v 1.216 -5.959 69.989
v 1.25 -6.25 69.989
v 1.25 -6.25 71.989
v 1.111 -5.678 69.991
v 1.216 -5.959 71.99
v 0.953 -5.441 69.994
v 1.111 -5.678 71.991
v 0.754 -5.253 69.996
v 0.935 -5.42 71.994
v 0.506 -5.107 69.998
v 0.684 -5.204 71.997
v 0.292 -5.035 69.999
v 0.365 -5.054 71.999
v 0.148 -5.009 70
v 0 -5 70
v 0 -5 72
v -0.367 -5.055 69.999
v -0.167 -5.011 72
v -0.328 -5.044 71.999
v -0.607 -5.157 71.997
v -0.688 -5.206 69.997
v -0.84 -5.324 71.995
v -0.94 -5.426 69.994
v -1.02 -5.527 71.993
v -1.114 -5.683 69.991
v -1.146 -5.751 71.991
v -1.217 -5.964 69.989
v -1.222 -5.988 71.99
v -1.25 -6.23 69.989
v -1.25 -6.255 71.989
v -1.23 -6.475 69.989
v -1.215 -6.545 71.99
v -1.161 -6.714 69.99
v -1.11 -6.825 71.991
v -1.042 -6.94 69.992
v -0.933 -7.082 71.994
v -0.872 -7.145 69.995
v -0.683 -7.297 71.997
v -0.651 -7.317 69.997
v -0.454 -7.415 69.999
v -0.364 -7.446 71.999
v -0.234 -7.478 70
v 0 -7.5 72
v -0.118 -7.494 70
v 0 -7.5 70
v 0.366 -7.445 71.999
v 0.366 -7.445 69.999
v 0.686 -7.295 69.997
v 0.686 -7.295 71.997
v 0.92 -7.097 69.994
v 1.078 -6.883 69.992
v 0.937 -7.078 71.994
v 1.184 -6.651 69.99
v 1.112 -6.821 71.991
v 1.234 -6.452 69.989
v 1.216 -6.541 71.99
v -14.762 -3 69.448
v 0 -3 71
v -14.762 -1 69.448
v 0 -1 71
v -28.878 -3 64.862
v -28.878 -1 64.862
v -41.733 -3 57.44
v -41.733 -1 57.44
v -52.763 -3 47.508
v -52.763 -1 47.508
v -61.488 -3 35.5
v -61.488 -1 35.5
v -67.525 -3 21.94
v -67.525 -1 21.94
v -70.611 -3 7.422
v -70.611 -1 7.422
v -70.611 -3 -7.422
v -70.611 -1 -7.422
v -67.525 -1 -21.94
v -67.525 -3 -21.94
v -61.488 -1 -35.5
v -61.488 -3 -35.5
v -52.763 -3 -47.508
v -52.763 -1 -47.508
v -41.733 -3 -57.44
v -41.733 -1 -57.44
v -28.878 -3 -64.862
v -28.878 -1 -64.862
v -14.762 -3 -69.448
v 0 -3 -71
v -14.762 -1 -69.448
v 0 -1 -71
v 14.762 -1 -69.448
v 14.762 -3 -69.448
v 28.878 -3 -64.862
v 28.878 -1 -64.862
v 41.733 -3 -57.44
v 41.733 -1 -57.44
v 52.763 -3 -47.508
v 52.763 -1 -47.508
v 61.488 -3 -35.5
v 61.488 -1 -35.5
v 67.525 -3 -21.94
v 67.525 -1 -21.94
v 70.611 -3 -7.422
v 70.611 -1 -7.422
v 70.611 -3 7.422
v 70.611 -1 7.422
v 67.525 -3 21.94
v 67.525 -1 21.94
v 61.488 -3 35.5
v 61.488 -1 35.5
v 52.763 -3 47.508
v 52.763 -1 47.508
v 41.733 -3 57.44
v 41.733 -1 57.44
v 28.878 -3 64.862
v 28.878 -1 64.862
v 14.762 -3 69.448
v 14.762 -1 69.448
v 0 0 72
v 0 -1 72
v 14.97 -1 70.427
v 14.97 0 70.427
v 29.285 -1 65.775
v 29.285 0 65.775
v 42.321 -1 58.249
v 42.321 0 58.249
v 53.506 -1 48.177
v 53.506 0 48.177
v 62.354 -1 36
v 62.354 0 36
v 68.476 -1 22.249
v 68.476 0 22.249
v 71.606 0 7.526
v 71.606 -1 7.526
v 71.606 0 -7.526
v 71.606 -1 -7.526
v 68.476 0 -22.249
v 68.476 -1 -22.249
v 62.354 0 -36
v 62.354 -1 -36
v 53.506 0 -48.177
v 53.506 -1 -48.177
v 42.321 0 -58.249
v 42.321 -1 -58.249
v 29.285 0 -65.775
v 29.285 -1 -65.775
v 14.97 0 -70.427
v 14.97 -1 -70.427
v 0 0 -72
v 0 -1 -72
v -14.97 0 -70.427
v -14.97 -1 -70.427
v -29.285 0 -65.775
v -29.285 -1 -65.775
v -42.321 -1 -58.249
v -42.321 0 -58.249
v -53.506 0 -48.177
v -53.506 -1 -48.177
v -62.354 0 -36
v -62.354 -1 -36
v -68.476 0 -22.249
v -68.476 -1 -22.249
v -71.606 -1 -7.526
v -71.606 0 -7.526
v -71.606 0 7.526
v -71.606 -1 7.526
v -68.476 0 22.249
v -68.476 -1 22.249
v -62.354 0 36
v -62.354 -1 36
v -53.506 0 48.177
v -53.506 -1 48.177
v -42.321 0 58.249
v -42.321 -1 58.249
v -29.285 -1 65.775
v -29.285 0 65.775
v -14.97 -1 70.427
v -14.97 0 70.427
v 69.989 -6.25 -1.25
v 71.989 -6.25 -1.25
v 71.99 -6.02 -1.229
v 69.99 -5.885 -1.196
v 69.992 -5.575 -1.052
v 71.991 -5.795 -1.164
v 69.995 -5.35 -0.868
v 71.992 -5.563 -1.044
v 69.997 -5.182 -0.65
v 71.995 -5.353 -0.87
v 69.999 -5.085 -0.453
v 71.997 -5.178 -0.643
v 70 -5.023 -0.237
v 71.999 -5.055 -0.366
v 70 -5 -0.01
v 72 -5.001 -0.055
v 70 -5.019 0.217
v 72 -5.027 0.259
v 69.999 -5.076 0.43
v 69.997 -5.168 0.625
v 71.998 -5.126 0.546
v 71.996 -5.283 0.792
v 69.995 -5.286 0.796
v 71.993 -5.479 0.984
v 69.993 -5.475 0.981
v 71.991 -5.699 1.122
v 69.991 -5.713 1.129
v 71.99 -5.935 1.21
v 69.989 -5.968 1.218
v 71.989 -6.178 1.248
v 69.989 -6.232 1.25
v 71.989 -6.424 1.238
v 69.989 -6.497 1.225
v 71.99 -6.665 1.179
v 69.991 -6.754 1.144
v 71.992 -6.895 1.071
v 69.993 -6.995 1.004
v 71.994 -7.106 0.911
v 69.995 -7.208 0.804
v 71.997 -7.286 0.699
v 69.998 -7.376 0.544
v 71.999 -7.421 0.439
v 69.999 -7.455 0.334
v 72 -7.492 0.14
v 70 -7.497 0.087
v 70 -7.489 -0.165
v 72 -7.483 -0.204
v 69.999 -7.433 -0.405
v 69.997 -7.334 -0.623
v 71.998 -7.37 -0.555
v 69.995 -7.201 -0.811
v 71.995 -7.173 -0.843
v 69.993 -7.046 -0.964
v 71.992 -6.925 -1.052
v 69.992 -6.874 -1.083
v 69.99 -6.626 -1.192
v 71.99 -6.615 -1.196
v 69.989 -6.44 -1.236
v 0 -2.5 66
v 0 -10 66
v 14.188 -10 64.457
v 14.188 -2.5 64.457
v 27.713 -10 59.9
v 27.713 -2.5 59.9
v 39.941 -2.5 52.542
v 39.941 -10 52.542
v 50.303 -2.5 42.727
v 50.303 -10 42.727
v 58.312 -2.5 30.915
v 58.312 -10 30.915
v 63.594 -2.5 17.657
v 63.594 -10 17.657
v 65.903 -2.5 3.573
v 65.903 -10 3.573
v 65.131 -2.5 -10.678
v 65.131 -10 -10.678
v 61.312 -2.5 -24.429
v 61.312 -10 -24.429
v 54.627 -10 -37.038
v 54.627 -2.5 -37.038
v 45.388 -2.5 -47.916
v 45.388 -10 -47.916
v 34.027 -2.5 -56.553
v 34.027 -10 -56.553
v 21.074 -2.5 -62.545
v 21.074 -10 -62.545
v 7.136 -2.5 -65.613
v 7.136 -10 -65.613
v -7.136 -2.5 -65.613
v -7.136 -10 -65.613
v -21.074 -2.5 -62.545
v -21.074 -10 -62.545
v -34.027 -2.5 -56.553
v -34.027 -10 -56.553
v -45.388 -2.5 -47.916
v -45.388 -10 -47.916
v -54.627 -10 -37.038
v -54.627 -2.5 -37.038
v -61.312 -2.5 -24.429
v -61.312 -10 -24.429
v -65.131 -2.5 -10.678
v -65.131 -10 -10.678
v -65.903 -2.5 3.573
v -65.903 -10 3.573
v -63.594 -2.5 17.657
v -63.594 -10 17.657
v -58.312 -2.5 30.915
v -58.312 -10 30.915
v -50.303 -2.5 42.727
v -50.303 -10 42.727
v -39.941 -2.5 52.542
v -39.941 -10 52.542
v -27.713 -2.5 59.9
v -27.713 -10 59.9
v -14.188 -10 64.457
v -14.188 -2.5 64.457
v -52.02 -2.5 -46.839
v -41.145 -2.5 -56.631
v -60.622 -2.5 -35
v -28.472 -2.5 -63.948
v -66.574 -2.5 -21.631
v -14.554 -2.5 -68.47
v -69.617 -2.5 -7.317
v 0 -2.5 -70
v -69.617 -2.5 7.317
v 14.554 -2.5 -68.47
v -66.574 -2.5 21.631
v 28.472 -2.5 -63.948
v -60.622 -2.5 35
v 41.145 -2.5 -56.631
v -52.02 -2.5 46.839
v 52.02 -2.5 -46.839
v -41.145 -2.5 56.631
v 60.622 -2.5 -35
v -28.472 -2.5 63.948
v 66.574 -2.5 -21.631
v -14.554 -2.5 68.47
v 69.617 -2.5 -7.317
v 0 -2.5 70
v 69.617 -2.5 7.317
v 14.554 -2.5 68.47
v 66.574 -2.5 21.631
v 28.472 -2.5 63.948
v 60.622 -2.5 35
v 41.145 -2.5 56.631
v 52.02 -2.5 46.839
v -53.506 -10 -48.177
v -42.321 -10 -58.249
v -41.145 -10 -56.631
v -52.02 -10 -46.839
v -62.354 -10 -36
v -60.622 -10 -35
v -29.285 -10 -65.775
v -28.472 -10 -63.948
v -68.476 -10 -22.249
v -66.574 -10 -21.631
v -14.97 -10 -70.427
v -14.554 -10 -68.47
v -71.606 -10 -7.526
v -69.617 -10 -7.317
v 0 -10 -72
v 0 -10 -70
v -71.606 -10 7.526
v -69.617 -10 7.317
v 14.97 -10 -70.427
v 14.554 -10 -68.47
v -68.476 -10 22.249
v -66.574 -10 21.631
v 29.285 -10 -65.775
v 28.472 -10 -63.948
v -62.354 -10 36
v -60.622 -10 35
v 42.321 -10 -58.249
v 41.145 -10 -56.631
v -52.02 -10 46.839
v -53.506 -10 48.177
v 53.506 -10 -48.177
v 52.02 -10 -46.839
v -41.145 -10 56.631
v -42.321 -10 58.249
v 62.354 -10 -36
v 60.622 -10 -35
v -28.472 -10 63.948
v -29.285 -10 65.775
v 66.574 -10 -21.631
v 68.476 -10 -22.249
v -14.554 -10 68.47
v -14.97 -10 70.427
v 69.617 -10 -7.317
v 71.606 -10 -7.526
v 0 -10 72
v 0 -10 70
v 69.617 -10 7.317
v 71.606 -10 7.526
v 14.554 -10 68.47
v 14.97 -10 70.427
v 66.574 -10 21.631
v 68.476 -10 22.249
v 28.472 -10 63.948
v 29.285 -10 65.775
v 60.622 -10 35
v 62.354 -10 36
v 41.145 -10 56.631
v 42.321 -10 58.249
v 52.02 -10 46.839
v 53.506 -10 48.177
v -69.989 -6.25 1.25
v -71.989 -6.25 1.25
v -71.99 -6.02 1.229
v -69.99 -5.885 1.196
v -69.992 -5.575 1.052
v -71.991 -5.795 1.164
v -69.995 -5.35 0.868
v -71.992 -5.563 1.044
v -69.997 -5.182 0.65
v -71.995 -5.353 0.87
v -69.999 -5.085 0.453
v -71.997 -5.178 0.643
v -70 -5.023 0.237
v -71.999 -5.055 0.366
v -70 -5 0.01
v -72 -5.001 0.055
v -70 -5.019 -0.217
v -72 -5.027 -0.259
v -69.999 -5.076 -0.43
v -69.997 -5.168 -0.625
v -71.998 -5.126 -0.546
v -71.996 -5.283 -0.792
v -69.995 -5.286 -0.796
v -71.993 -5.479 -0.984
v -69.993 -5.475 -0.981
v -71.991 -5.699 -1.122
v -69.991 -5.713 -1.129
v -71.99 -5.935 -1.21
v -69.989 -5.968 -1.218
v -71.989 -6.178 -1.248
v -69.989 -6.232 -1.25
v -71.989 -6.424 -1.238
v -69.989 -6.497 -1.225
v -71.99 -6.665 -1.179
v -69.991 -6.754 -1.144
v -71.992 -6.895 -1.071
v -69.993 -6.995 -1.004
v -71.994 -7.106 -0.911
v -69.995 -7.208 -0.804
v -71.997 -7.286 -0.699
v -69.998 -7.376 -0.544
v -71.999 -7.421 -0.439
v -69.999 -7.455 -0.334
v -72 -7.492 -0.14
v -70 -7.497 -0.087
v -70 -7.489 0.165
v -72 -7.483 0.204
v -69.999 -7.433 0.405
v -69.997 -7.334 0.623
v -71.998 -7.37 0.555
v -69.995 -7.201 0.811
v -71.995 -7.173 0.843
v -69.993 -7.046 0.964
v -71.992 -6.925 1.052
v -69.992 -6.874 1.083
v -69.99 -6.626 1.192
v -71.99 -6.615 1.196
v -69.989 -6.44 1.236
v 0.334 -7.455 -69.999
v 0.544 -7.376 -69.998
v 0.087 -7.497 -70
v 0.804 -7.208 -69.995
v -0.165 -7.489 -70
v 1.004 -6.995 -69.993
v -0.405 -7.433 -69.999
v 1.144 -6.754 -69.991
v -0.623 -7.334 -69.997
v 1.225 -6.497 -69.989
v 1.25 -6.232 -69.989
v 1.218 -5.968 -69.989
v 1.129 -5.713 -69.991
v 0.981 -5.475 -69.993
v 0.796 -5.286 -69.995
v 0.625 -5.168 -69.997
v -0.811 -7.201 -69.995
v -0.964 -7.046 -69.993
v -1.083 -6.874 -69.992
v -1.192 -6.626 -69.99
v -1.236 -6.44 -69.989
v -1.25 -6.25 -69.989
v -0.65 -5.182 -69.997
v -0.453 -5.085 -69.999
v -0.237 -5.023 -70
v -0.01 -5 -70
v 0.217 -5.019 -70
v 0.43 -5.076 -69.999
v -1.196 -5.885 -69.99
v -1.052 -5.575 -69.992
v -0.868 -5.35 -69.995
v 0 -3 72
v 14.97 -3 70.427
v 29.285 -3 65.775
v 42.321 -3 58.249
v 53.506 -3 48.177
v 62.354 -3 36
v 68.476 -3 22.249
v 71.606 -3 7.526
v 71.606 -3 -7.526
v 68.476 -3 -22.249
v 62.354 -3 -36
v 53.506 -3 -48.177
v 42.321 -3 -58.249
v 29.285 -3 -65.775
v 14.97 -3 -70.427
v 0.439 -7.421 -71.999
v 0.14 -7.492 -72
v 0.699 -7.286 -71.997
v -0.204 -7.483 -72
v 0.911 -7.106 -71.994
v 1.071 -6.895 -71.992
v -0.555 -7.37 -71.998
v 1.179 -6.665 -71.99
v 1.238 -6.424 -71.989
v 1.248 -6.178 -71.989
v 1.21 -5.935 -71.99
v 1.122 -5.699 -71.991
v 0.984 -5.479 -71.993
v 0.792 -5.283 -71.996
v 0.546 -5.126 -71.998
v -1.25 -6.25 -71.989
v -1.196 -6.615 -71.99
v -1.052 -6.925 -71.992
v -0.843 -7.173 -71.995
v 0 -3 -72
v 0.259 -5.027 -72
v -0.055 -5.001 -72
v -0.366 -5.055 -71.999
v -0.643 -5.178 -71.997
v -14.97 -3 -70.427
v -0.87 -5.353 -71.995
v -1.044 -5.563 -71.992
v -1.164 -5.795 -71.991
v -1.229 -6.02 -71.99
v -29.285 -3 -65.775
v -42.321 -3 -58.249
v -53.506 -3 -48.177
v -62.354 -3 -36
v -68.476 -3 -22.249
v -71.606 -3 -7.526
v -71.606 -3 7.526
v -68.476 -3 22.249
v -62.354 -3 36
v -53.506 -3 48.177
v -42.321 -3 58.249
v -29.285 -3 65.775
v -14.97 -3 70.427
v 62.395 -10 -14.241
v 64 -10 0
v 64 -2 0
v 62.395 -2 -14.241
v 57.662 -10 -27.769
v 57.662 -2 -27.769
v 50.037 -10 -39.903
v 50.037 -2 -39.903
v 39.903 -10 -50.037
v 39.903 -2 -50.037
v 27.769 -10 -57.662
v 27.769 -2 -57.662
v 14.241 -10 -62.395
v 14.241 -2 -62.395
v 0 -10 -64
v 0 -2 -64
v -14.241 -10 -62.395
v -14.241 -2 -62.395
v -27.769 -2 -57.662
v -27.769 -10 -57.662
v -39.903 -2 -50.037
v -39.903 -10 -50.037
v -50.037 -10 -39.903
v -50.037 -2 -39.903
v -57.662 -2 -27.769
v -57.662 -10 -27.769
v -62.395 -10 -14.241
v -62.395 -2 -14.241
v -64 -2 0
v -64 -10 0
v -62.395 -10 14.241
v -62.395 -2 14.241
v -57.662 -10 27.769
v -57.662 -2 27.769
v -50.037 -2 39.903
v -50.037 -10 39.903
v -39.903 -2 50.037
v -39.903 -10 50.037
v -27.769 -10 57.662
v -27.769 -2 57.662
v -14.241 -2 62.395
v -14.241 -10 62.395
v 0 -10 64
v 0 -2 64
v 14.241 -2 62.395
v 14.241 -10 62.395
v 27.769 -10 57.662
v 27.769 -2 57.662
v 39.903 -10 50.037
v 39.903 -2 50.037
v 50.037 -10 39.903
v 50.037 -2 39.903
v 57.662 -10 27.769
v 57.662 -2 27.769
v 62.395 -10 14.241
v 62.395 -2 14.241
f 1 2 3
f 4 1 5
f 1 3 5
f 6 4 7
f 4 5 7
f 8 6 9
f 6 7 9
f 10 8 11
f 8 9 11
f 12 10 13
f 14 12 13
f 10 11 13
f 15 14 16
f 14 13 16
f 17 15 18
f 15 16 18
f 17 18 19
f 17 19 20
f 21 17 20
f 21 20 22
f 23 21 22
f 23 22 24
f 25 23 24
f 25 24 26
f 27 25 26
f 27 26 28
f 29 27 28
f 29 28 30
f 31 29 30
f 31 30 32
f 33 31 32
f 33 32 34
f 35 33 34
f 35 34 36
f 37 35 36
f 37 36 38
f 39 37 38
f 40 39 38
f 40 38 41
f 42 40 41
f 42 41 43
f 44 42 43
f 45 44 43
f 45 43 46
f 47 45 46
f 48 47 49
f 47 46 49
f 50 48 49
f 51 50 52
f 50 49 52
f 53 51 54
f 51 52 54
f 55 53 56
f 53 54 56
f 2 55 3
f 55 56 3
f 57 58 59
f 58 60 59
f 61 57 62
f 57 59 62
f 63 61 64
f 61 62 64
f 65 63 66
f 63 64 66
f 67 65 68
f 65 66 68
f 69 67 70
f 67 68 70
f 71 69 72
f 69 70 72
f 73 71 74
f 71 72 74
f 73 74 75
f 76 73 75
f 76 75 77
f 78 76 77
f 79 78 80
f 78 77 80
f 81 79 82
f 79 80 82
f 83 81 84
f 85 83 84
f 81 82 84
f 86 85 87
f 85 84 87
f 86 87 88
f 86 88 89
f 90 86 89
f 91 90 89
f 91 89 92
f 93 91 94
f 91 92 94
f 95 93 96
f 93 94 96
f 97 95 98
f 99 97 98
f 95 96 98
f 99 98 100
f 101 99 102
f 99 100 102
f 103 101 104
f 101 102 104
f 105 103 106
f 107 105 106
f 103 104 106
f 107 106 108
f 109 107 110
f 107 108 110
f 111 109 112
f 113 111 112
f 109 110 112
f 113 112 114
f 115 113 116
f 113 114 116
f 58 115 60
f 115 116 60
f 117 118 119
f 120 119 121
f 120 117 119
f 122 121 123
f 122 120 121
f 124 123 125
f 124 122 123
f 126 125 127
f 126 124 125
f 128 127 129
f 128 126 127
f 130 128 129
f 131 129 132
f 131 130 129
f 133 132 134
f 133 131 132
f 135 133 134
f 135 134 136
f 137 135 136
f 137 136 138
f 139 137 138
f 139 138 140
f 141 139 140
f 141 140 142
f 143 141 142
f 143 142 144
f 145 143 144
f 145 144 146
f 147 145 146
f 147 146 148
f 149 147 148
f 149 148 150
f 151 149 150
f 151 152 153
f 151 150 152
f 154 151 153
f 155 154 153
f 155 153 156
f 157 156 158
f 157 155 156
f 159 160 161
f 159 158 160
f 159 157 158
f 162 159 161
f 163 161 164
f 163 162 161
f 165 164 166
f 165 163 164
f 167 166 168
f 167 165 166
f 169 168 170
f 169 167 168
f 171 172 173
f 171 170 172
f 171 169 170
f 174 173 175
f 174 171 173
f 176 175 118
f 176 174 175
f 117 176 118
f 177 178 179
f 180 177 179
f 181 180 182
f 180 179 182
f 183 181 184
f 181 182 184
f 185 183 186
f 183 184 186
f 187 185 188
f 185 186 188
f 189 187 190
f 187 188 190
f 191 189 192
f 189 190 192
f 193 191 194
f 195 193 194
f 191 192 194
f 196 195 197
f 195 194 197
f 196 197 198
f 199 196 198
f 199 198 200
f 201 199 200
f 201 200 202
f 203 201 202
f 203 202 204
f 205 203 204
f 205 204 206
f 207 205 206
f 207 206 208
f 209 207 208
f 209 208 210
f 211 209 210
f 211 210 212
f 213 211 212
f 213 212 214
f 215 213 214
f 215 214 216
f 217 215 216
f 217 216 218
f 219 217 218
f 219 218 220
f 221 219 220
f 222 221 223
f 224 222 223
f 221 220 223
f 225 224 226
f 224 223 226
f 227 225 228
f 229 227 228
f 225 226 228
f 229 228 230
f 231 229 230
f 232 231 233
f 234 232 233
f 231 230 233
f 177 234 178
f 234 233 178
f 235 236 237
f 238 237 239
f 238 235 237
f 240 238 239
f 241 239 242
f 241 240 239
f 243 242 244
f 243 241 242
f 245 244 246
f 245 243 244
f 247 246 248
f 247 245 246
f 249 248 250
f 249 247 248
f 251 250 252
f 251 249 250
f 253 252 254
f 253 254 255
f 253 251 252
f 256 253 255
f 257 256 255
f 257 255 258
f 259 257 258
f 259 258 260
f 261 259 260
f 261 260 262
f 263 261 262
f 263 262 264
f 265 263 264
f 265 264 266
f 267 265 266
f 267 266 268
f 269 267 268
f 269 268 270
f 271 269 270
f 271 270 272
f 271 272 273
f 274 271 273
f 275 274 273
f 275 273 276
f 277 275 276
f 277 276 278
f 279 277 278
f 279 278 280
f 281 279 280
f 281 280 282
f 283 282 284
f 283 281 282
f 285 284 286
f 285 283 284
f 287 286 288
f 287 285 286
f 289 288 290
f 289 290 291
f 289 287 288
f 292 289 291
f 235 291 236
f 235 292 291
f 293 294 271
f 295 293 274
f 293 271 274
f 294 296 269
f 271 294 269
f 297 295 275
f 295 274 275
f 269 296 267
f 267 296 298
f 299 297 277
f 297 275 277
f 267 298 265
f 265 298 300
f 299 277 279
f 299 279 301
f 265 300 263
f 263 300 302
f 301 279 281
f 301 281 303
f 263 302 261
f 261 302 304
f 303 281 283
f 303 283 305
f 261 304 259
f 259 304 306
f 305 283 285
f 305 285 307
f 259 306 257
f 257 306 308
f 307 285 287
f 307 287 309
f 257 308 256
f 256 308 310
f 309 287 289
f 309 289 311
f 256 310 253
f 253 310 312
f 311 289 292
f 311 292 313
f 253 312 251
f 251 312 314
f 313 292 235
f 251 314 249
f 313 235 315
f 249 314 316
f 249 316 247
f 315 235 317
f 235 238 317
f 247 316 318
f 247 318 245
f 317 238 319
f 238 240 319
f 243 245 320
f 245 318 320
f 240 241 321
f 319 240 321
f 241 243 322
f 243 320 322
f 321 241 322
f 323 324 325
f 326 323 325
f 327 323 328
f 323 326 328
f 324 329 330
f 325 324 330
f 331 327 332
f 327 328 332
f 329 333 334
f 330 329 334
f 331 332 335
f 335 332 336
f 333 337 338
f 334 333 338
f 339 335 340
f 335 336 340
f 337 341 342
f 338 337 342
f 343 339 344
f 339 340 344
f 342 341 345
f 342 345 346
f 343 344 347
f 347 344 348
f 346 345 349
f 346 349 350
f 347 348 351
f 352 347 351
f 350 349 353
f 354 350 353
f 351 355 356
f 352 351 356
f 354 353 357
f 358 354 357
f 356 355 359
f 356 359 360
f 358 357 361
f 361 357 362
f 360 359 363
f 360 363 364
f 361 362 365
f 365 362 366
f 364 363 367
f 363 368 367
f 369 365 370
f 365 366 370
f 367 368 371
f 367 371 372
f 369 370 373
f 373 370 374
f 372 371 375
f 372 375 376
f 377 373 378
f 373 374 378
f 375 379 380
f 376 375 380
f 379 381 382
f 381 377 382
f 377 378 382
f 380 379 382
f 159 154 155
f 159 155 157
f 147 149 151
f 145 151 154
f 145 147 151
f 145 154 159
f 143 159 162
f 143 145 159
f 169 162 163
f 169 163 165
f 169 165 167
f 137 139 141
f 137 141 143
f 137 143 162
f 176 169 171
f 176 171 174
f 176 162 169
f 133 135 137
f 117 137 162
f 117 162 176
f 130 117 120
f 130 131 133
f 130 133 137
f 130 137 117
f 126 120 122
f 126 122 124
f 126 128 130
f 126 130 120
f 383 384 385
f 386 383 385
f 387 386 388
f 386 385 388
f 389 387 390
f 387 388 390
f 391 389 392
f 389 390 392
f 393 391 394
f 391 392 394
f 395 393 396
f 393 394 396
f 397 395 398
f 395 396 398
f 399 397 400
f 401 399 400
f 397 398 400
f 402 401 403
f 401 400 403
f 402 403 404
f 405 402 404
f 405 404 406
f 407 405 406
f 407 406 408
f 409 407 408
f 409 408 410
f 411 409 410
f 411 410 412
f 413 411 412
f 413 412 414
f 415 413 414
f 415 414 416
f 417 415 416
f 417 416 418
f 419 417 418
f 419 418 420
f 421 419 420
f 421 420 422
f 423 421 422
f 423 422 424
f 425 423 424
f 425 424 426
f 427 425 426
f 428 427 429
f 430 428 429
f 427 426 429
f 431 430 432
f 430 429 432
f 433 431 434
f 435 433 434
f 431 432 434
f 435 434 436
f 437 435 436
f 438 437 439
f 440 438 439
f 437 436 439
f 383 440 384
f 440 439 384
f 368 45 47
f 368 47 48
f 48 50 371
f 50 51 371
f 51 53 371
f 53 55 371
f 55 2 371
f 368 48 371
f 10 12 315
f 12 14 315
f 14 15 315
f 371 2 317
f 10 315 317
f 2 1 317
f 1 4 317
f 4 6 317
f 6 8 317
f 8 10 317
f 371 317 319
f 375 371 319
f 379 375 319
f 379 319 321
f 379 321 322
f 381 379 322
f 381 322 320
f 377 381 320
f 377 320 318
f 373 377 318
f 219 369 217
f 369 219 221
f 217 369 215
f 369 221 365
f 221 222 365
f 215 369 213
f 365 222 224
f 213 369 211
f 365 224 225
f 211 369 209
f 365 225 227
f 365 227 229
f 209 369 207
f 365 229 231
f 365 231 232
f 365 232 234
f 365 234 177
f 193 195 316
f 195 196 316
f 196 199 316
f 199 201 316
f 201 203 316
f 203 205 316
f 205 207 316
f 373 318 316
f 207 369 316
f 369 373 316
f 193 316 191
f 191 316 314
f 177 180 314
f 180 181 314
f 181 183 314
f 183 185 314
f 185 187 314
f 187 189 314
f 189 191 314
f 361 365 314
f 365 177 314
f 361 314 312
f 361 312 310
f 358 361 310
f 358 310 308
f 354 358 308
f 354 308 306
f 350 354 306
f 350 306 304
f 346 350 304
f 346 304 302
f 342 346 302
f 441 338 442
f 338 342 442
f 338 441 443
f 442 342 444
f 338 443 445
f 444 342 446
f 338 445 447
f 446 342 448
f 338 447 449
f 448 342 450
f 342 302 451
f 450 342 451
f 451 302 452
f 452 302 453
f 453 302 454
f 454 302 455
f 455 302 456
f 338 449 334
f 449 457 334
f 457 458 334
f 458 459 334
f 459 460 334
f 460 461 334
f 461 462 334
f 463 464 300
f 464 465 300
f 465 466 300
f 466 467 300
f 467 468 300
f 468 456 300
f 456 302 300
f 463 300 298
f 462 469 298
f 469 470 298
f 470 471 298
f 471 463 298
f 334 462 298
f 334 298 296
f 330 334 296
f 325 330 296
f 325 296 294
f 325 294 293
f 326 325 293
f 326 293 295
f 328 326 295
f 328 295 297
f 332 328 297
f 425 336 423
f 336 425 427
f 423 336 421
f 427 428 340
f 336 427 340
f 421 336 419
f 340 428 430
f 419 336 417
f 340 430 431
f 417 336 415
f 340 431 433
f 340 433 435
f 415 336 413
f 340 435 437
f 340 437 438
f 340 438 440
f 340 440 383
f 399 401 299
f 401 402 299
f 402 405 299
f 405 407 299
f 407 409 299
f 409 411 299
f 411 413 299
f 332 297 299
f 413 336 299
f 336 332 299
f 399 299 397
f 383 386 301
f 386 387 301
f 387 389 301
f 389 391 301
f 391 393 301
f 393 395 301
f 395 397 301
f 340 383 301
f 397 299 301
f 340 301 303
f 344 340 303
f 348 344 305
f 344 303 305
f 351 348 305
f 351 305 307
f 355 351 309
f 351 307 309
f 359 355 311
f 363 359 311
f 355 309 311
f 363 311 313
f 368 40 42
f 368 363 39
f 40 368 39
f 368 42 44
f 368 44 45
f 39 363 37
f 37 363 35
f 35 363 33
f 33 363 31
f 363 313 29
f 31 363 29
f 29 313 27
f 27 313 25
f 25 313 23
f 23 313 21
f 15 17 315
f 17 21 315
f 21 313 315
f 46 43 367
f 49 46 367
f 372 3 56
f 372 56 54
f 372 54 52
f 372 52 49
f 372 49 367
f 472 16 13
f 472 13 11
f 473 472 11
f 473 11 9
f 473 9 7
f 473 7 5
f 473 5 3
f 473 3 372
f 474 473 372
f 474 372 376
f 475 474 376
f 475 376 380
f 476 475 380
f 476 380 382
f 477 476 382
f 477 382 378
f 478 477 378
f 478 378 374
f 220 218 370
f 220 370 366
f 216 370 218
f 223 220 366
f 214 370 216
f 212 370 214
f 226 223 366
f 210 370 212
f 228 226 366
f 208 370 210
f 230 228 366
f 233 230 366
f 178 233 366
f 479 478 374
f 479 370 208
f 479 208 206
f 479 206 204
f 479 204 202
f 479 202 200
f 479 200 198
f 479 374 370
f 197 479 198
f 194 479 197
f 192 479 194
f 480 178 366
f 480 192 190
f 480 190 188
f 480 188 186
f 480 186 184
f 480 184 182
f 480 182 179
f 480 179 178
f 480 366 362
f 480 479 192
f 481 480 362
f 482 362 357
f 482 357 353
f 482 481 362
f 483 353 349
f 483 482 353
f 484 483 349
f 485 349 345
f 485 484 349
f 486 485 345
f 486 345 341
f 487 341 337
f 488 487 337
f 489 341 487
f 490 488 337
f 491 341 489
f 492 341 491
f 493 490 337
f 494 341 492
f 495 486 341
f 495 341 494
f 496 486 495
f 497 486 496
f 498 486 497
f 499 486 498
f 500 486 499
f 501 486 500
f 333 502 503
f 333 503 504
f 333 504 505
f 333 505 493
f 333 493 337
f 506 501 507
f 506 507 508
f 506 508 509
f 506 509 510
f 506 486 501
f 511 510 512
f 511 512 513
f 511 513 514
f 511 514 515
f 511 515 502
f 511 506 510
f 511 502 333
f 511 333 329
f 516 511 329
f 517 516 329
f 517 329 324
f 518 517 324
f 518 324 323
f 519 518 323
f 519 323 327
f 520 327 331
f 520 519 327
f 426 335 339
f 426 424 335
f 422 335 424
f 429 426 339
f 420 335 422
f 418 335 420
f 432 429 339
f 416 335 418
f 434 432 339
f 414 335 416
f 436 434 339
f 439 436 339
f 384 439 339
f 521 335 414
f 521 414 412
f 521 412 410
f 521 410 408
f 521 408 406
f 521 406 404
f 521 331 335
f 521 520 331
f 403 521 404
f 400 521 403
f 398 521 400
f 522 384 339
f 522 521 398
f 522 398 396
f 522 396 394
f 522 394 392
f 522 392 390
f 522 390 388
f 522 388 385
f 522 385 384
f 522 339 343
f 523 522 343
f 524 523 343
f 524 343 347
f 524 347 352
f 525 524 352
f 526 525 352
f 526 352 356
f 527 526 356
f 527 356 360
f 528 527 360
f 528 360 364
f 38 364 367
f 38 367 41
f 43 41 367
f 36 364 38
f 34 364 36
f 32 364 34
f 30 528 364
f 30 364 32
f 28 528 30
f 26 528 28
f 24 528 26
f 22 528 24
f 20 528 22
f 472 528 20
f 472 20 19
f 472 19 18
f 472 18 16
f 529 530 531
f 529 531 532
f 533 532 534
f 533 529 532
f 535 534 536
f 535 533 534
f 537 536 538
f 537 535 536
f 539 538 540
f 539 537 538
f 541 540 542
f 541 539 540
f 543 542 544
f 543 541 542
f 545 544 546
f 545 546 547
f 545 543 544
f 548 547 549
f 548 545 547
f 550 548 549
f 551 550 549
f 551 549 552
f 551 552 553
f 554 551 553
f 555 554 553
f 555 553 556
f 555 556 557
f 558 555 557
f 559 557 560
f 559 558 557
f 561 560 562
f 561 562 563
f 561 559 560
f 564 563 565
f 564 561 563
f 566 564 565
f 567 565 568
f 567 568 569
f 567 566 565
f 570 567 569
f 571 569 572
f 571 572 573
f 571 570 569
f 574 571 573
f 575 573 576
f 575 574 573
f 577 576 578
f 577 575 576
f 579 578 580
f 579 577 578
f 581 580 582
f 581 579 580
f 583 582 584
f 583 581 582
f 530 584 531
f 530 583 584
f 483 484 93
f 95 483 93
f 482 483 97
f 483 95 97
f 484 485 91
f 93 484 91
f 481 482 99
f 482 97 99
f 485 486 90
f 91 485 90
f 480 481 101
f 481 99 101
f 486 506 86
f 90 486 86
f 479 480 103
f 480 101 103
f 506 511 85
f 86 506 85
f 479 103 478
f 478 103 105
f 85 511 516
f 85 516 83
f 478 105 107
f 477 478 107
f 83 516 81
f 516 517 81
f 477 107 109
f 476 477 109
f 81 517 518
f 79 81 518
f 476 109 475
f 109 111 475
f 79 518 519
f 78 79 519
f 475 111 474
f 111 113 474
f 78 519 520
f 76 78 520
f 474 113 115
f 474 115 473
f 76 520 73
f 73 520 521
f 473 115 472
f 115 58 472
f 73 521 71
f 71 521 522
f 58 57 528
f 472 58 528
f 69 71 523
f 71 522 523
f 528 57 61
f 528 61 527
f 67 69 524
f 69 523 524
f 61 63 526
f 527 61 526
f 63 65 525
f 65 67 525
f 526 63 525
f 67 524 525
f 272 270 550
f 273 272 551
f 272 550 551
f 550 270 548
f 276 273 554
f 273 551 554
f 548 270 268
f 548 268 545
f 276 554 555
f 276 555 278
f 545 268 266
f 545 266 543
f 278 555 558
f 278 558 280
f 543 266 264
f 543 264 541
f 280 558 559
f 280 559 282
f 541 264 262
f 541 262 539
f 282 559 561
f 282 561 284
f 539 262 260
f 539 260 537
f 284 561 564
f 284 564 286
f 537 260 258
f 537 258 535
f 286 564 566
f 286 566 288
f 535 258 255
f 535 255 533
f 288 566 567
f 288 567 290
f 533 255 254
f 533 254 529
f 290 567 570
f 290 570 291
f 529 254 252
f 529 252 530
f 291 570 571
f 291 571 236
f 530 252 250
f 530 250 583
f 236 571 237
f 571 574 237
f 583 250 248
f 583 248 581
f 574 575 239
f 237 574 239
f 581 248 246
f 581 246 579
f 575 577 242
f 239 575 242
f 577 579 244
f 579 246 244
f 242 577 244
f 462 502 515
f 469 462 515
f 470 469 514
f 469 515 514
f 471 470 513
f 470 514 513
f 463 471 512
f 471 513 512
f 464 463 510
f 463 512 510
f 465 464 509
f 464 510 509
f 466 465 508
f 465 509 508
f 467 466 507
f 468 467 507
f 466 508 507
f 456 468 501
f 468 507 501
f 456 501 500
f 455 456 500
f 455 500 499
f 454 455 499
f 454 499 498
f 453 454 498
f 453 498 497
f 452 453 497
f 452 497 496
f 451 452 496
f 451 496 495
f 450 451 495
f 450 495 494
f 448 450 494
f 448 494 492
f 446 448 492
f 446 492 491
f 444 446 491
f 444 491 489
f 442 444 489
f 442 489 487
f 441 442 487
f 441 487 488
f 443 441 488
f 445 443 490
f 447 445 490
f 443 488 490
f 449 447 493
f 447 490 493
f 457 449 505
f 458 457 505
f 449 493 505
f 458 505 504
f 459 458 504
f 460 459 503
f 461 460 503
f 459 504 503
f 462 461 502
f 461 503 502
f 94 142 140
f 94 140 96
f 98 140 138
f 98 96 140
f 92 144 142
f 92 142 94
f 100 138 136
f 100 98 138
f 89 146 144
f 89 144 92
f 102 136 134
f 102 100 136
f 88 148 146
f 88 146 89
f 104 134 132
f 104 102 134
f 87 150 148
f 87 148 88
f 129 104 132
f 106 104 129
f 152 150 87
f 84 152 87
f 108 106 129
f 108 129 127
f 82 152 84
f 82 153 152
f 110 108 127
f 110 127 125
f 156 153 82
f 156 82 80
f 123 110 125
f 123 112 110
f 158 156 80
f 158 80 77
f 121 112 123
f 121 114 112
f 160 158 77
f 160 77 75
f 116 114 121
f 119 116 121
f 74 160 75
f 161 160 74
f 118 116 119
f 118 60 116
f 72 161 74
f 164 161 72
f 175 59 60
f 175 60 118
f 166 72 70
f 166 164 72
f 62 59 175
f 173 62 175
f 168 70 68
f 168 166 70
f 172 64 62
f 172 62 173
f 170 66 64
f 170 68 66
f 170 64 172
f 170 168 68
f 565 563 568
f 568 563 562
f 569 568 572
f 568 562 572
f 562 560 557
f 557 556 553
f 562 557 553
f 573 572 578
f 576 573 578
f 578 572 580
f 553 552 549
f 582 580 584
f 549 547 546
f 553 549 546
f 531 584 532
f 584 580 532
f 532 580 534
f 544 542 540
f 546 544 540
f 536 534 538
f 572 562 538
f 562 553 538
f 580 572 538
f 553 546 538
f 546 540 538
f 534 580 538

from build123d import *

# Parameters (mm, degrees)
SKETCH_9_R               = 72
SKETCH_9_R_2             = 70
EXTRUDE_9_DEPTH          = 10
SKETCH_9_18_R            = 70
SKETCH_9_18_R_2          = 66
EXTRUDE_10_DEPTH         = 2.5
SKETCH_9_19_R            = 66
EXTRUDE_11_DEPTH         = 10
SHELL_START              = -10
SHELL_2_OUTLINE_R        = 64
SHELL_2_DEPTH            = 8
F_2_5MM_1_REACH          = 163.118
F_2_5MM_1_BORE_R         = 1.25
PATTERN_CIRCULAR_1_COUNT = 4
SKETCH_15_W              = 1
SKETCH_15_H              = 2


# Read off the part's stored shape, not the designer's step: 薄殼2
with BuildPart() as part:
    # 草圖9 → 填料-伸長9 (new body)
    with BuildSketch(Plane(origin=(0, 0, 0), x_dir=(1, 0, 0), z_dir=(0, 1, 0))):
        with Locations(Location((0, 0, 0), (0, 0, 270))):
            Circle(SKETCH_9_R)
        with Locations(Location((0, 0, 0), (0, 0, 270))):
            Circle(SKETCH_9_R_2, mode=Mode.SUBTRACT)
    extrude(amount=-EXTRUDE_9_DEPTH)

    # 草圖9<18> → 填料-伸長10 (add)
    with BuildSketch(Plane(origin=(0, 0, 0), x_dir=(1, 0, 0), z_dir=(0, 1, 0))):
        with Locations(Location((0, 0, 0), (0, 0, 270))):
            Circle(SKETCH_9_18_R)
        with Locations(Location((0, 0, 0), (0, 0, 270))):
            Circle(SKETCH_9_18_R_2, mode=Mode.SUBTRACT)
    extrude(amount=-EXTRUDE_10_DEPTH)

    # 草圖9<19> → 填料-伸長11 (add)
    with BuildSketch(Plane(origin=(0, 0, 0), x_dir=(1, 0, 0), z_dir=(0, 1, 0))):
        with Locations(Location((0, 0, 0), (0, 0, 270))):
            Circle(SKETCH_9_19_R)
    extrude(amount=-EXTRUDE_11_DEPTH)

    # 薄殼2 outline → 薄殼2 (cut)
    with BuildSketch(Plane(origin=(0, 0, 0), x_dir=(1, 0, 0), z_dir=(0, 1, 0)).offset(SHELL_START)):
        Circle(SHELL_2_OUTLINE_R)
    extrude(amount=SHELL_2_DEPTH, mode=Mode.SUBTRACT)

    # Ø2.5mm 定位孔1 bore (on position points) → Ø2.5mm 定位孔1 (cut, up to next)
    with BuildSketch(Plane(origin=(0, -6.25, 72), x_dir=(1, 0, 0), z_dir=(0, 0, 1)), mode=Mode.PRIVATE) as f_2_5mm_1_sk1:
        Circle(F_2_5MM_1_BORE_R)
    f_2_5mm_1_tool1 = extrude(f_2_5mm_1_sk1.sketch, amount=-F_2_5MM_1_REACH, mode=Mode.PRIVATE) & part.part
    f_2_5mm_1 = f_2_5mm_1_tool1.solids().sort_by_distance((0, -6.25, 72))[0]
    add(f_2_5mm_1, mode=Mode.SUBTRACT)

    # 環狀複製排列1: Ø2.5mm 定位孔1 ×4 about axis
    pattern_circular_1_axis = Axis((0, -10, 0), (0, 1, 0))
    for i in range(1, PATTERN_CIRCULAR_1_COUNT):
        add(f_2_5mm_1.rotate(pattern_circular_1_axis, i * 360 / PATTERN_CIRCULAR_1_COUNT), mode=Mode.SUBTRACT)

    # 草圖15 → 除料-旋轉2 (revolve, cut)
    with BuildSketch(Plane(origin=(0, 0, 0), x_dir=(0, 0, -1), z_dir=(1, 0, 0))):
        with Locations((-71.5, -2)):
            Rectangle(SKETCH_15_W, SKETCH_15_H)
    revolve(axis=Axis((0, 0, 0), (0, -1, 0)), mode=Mode.SUBTRACT)


solid = part.part
